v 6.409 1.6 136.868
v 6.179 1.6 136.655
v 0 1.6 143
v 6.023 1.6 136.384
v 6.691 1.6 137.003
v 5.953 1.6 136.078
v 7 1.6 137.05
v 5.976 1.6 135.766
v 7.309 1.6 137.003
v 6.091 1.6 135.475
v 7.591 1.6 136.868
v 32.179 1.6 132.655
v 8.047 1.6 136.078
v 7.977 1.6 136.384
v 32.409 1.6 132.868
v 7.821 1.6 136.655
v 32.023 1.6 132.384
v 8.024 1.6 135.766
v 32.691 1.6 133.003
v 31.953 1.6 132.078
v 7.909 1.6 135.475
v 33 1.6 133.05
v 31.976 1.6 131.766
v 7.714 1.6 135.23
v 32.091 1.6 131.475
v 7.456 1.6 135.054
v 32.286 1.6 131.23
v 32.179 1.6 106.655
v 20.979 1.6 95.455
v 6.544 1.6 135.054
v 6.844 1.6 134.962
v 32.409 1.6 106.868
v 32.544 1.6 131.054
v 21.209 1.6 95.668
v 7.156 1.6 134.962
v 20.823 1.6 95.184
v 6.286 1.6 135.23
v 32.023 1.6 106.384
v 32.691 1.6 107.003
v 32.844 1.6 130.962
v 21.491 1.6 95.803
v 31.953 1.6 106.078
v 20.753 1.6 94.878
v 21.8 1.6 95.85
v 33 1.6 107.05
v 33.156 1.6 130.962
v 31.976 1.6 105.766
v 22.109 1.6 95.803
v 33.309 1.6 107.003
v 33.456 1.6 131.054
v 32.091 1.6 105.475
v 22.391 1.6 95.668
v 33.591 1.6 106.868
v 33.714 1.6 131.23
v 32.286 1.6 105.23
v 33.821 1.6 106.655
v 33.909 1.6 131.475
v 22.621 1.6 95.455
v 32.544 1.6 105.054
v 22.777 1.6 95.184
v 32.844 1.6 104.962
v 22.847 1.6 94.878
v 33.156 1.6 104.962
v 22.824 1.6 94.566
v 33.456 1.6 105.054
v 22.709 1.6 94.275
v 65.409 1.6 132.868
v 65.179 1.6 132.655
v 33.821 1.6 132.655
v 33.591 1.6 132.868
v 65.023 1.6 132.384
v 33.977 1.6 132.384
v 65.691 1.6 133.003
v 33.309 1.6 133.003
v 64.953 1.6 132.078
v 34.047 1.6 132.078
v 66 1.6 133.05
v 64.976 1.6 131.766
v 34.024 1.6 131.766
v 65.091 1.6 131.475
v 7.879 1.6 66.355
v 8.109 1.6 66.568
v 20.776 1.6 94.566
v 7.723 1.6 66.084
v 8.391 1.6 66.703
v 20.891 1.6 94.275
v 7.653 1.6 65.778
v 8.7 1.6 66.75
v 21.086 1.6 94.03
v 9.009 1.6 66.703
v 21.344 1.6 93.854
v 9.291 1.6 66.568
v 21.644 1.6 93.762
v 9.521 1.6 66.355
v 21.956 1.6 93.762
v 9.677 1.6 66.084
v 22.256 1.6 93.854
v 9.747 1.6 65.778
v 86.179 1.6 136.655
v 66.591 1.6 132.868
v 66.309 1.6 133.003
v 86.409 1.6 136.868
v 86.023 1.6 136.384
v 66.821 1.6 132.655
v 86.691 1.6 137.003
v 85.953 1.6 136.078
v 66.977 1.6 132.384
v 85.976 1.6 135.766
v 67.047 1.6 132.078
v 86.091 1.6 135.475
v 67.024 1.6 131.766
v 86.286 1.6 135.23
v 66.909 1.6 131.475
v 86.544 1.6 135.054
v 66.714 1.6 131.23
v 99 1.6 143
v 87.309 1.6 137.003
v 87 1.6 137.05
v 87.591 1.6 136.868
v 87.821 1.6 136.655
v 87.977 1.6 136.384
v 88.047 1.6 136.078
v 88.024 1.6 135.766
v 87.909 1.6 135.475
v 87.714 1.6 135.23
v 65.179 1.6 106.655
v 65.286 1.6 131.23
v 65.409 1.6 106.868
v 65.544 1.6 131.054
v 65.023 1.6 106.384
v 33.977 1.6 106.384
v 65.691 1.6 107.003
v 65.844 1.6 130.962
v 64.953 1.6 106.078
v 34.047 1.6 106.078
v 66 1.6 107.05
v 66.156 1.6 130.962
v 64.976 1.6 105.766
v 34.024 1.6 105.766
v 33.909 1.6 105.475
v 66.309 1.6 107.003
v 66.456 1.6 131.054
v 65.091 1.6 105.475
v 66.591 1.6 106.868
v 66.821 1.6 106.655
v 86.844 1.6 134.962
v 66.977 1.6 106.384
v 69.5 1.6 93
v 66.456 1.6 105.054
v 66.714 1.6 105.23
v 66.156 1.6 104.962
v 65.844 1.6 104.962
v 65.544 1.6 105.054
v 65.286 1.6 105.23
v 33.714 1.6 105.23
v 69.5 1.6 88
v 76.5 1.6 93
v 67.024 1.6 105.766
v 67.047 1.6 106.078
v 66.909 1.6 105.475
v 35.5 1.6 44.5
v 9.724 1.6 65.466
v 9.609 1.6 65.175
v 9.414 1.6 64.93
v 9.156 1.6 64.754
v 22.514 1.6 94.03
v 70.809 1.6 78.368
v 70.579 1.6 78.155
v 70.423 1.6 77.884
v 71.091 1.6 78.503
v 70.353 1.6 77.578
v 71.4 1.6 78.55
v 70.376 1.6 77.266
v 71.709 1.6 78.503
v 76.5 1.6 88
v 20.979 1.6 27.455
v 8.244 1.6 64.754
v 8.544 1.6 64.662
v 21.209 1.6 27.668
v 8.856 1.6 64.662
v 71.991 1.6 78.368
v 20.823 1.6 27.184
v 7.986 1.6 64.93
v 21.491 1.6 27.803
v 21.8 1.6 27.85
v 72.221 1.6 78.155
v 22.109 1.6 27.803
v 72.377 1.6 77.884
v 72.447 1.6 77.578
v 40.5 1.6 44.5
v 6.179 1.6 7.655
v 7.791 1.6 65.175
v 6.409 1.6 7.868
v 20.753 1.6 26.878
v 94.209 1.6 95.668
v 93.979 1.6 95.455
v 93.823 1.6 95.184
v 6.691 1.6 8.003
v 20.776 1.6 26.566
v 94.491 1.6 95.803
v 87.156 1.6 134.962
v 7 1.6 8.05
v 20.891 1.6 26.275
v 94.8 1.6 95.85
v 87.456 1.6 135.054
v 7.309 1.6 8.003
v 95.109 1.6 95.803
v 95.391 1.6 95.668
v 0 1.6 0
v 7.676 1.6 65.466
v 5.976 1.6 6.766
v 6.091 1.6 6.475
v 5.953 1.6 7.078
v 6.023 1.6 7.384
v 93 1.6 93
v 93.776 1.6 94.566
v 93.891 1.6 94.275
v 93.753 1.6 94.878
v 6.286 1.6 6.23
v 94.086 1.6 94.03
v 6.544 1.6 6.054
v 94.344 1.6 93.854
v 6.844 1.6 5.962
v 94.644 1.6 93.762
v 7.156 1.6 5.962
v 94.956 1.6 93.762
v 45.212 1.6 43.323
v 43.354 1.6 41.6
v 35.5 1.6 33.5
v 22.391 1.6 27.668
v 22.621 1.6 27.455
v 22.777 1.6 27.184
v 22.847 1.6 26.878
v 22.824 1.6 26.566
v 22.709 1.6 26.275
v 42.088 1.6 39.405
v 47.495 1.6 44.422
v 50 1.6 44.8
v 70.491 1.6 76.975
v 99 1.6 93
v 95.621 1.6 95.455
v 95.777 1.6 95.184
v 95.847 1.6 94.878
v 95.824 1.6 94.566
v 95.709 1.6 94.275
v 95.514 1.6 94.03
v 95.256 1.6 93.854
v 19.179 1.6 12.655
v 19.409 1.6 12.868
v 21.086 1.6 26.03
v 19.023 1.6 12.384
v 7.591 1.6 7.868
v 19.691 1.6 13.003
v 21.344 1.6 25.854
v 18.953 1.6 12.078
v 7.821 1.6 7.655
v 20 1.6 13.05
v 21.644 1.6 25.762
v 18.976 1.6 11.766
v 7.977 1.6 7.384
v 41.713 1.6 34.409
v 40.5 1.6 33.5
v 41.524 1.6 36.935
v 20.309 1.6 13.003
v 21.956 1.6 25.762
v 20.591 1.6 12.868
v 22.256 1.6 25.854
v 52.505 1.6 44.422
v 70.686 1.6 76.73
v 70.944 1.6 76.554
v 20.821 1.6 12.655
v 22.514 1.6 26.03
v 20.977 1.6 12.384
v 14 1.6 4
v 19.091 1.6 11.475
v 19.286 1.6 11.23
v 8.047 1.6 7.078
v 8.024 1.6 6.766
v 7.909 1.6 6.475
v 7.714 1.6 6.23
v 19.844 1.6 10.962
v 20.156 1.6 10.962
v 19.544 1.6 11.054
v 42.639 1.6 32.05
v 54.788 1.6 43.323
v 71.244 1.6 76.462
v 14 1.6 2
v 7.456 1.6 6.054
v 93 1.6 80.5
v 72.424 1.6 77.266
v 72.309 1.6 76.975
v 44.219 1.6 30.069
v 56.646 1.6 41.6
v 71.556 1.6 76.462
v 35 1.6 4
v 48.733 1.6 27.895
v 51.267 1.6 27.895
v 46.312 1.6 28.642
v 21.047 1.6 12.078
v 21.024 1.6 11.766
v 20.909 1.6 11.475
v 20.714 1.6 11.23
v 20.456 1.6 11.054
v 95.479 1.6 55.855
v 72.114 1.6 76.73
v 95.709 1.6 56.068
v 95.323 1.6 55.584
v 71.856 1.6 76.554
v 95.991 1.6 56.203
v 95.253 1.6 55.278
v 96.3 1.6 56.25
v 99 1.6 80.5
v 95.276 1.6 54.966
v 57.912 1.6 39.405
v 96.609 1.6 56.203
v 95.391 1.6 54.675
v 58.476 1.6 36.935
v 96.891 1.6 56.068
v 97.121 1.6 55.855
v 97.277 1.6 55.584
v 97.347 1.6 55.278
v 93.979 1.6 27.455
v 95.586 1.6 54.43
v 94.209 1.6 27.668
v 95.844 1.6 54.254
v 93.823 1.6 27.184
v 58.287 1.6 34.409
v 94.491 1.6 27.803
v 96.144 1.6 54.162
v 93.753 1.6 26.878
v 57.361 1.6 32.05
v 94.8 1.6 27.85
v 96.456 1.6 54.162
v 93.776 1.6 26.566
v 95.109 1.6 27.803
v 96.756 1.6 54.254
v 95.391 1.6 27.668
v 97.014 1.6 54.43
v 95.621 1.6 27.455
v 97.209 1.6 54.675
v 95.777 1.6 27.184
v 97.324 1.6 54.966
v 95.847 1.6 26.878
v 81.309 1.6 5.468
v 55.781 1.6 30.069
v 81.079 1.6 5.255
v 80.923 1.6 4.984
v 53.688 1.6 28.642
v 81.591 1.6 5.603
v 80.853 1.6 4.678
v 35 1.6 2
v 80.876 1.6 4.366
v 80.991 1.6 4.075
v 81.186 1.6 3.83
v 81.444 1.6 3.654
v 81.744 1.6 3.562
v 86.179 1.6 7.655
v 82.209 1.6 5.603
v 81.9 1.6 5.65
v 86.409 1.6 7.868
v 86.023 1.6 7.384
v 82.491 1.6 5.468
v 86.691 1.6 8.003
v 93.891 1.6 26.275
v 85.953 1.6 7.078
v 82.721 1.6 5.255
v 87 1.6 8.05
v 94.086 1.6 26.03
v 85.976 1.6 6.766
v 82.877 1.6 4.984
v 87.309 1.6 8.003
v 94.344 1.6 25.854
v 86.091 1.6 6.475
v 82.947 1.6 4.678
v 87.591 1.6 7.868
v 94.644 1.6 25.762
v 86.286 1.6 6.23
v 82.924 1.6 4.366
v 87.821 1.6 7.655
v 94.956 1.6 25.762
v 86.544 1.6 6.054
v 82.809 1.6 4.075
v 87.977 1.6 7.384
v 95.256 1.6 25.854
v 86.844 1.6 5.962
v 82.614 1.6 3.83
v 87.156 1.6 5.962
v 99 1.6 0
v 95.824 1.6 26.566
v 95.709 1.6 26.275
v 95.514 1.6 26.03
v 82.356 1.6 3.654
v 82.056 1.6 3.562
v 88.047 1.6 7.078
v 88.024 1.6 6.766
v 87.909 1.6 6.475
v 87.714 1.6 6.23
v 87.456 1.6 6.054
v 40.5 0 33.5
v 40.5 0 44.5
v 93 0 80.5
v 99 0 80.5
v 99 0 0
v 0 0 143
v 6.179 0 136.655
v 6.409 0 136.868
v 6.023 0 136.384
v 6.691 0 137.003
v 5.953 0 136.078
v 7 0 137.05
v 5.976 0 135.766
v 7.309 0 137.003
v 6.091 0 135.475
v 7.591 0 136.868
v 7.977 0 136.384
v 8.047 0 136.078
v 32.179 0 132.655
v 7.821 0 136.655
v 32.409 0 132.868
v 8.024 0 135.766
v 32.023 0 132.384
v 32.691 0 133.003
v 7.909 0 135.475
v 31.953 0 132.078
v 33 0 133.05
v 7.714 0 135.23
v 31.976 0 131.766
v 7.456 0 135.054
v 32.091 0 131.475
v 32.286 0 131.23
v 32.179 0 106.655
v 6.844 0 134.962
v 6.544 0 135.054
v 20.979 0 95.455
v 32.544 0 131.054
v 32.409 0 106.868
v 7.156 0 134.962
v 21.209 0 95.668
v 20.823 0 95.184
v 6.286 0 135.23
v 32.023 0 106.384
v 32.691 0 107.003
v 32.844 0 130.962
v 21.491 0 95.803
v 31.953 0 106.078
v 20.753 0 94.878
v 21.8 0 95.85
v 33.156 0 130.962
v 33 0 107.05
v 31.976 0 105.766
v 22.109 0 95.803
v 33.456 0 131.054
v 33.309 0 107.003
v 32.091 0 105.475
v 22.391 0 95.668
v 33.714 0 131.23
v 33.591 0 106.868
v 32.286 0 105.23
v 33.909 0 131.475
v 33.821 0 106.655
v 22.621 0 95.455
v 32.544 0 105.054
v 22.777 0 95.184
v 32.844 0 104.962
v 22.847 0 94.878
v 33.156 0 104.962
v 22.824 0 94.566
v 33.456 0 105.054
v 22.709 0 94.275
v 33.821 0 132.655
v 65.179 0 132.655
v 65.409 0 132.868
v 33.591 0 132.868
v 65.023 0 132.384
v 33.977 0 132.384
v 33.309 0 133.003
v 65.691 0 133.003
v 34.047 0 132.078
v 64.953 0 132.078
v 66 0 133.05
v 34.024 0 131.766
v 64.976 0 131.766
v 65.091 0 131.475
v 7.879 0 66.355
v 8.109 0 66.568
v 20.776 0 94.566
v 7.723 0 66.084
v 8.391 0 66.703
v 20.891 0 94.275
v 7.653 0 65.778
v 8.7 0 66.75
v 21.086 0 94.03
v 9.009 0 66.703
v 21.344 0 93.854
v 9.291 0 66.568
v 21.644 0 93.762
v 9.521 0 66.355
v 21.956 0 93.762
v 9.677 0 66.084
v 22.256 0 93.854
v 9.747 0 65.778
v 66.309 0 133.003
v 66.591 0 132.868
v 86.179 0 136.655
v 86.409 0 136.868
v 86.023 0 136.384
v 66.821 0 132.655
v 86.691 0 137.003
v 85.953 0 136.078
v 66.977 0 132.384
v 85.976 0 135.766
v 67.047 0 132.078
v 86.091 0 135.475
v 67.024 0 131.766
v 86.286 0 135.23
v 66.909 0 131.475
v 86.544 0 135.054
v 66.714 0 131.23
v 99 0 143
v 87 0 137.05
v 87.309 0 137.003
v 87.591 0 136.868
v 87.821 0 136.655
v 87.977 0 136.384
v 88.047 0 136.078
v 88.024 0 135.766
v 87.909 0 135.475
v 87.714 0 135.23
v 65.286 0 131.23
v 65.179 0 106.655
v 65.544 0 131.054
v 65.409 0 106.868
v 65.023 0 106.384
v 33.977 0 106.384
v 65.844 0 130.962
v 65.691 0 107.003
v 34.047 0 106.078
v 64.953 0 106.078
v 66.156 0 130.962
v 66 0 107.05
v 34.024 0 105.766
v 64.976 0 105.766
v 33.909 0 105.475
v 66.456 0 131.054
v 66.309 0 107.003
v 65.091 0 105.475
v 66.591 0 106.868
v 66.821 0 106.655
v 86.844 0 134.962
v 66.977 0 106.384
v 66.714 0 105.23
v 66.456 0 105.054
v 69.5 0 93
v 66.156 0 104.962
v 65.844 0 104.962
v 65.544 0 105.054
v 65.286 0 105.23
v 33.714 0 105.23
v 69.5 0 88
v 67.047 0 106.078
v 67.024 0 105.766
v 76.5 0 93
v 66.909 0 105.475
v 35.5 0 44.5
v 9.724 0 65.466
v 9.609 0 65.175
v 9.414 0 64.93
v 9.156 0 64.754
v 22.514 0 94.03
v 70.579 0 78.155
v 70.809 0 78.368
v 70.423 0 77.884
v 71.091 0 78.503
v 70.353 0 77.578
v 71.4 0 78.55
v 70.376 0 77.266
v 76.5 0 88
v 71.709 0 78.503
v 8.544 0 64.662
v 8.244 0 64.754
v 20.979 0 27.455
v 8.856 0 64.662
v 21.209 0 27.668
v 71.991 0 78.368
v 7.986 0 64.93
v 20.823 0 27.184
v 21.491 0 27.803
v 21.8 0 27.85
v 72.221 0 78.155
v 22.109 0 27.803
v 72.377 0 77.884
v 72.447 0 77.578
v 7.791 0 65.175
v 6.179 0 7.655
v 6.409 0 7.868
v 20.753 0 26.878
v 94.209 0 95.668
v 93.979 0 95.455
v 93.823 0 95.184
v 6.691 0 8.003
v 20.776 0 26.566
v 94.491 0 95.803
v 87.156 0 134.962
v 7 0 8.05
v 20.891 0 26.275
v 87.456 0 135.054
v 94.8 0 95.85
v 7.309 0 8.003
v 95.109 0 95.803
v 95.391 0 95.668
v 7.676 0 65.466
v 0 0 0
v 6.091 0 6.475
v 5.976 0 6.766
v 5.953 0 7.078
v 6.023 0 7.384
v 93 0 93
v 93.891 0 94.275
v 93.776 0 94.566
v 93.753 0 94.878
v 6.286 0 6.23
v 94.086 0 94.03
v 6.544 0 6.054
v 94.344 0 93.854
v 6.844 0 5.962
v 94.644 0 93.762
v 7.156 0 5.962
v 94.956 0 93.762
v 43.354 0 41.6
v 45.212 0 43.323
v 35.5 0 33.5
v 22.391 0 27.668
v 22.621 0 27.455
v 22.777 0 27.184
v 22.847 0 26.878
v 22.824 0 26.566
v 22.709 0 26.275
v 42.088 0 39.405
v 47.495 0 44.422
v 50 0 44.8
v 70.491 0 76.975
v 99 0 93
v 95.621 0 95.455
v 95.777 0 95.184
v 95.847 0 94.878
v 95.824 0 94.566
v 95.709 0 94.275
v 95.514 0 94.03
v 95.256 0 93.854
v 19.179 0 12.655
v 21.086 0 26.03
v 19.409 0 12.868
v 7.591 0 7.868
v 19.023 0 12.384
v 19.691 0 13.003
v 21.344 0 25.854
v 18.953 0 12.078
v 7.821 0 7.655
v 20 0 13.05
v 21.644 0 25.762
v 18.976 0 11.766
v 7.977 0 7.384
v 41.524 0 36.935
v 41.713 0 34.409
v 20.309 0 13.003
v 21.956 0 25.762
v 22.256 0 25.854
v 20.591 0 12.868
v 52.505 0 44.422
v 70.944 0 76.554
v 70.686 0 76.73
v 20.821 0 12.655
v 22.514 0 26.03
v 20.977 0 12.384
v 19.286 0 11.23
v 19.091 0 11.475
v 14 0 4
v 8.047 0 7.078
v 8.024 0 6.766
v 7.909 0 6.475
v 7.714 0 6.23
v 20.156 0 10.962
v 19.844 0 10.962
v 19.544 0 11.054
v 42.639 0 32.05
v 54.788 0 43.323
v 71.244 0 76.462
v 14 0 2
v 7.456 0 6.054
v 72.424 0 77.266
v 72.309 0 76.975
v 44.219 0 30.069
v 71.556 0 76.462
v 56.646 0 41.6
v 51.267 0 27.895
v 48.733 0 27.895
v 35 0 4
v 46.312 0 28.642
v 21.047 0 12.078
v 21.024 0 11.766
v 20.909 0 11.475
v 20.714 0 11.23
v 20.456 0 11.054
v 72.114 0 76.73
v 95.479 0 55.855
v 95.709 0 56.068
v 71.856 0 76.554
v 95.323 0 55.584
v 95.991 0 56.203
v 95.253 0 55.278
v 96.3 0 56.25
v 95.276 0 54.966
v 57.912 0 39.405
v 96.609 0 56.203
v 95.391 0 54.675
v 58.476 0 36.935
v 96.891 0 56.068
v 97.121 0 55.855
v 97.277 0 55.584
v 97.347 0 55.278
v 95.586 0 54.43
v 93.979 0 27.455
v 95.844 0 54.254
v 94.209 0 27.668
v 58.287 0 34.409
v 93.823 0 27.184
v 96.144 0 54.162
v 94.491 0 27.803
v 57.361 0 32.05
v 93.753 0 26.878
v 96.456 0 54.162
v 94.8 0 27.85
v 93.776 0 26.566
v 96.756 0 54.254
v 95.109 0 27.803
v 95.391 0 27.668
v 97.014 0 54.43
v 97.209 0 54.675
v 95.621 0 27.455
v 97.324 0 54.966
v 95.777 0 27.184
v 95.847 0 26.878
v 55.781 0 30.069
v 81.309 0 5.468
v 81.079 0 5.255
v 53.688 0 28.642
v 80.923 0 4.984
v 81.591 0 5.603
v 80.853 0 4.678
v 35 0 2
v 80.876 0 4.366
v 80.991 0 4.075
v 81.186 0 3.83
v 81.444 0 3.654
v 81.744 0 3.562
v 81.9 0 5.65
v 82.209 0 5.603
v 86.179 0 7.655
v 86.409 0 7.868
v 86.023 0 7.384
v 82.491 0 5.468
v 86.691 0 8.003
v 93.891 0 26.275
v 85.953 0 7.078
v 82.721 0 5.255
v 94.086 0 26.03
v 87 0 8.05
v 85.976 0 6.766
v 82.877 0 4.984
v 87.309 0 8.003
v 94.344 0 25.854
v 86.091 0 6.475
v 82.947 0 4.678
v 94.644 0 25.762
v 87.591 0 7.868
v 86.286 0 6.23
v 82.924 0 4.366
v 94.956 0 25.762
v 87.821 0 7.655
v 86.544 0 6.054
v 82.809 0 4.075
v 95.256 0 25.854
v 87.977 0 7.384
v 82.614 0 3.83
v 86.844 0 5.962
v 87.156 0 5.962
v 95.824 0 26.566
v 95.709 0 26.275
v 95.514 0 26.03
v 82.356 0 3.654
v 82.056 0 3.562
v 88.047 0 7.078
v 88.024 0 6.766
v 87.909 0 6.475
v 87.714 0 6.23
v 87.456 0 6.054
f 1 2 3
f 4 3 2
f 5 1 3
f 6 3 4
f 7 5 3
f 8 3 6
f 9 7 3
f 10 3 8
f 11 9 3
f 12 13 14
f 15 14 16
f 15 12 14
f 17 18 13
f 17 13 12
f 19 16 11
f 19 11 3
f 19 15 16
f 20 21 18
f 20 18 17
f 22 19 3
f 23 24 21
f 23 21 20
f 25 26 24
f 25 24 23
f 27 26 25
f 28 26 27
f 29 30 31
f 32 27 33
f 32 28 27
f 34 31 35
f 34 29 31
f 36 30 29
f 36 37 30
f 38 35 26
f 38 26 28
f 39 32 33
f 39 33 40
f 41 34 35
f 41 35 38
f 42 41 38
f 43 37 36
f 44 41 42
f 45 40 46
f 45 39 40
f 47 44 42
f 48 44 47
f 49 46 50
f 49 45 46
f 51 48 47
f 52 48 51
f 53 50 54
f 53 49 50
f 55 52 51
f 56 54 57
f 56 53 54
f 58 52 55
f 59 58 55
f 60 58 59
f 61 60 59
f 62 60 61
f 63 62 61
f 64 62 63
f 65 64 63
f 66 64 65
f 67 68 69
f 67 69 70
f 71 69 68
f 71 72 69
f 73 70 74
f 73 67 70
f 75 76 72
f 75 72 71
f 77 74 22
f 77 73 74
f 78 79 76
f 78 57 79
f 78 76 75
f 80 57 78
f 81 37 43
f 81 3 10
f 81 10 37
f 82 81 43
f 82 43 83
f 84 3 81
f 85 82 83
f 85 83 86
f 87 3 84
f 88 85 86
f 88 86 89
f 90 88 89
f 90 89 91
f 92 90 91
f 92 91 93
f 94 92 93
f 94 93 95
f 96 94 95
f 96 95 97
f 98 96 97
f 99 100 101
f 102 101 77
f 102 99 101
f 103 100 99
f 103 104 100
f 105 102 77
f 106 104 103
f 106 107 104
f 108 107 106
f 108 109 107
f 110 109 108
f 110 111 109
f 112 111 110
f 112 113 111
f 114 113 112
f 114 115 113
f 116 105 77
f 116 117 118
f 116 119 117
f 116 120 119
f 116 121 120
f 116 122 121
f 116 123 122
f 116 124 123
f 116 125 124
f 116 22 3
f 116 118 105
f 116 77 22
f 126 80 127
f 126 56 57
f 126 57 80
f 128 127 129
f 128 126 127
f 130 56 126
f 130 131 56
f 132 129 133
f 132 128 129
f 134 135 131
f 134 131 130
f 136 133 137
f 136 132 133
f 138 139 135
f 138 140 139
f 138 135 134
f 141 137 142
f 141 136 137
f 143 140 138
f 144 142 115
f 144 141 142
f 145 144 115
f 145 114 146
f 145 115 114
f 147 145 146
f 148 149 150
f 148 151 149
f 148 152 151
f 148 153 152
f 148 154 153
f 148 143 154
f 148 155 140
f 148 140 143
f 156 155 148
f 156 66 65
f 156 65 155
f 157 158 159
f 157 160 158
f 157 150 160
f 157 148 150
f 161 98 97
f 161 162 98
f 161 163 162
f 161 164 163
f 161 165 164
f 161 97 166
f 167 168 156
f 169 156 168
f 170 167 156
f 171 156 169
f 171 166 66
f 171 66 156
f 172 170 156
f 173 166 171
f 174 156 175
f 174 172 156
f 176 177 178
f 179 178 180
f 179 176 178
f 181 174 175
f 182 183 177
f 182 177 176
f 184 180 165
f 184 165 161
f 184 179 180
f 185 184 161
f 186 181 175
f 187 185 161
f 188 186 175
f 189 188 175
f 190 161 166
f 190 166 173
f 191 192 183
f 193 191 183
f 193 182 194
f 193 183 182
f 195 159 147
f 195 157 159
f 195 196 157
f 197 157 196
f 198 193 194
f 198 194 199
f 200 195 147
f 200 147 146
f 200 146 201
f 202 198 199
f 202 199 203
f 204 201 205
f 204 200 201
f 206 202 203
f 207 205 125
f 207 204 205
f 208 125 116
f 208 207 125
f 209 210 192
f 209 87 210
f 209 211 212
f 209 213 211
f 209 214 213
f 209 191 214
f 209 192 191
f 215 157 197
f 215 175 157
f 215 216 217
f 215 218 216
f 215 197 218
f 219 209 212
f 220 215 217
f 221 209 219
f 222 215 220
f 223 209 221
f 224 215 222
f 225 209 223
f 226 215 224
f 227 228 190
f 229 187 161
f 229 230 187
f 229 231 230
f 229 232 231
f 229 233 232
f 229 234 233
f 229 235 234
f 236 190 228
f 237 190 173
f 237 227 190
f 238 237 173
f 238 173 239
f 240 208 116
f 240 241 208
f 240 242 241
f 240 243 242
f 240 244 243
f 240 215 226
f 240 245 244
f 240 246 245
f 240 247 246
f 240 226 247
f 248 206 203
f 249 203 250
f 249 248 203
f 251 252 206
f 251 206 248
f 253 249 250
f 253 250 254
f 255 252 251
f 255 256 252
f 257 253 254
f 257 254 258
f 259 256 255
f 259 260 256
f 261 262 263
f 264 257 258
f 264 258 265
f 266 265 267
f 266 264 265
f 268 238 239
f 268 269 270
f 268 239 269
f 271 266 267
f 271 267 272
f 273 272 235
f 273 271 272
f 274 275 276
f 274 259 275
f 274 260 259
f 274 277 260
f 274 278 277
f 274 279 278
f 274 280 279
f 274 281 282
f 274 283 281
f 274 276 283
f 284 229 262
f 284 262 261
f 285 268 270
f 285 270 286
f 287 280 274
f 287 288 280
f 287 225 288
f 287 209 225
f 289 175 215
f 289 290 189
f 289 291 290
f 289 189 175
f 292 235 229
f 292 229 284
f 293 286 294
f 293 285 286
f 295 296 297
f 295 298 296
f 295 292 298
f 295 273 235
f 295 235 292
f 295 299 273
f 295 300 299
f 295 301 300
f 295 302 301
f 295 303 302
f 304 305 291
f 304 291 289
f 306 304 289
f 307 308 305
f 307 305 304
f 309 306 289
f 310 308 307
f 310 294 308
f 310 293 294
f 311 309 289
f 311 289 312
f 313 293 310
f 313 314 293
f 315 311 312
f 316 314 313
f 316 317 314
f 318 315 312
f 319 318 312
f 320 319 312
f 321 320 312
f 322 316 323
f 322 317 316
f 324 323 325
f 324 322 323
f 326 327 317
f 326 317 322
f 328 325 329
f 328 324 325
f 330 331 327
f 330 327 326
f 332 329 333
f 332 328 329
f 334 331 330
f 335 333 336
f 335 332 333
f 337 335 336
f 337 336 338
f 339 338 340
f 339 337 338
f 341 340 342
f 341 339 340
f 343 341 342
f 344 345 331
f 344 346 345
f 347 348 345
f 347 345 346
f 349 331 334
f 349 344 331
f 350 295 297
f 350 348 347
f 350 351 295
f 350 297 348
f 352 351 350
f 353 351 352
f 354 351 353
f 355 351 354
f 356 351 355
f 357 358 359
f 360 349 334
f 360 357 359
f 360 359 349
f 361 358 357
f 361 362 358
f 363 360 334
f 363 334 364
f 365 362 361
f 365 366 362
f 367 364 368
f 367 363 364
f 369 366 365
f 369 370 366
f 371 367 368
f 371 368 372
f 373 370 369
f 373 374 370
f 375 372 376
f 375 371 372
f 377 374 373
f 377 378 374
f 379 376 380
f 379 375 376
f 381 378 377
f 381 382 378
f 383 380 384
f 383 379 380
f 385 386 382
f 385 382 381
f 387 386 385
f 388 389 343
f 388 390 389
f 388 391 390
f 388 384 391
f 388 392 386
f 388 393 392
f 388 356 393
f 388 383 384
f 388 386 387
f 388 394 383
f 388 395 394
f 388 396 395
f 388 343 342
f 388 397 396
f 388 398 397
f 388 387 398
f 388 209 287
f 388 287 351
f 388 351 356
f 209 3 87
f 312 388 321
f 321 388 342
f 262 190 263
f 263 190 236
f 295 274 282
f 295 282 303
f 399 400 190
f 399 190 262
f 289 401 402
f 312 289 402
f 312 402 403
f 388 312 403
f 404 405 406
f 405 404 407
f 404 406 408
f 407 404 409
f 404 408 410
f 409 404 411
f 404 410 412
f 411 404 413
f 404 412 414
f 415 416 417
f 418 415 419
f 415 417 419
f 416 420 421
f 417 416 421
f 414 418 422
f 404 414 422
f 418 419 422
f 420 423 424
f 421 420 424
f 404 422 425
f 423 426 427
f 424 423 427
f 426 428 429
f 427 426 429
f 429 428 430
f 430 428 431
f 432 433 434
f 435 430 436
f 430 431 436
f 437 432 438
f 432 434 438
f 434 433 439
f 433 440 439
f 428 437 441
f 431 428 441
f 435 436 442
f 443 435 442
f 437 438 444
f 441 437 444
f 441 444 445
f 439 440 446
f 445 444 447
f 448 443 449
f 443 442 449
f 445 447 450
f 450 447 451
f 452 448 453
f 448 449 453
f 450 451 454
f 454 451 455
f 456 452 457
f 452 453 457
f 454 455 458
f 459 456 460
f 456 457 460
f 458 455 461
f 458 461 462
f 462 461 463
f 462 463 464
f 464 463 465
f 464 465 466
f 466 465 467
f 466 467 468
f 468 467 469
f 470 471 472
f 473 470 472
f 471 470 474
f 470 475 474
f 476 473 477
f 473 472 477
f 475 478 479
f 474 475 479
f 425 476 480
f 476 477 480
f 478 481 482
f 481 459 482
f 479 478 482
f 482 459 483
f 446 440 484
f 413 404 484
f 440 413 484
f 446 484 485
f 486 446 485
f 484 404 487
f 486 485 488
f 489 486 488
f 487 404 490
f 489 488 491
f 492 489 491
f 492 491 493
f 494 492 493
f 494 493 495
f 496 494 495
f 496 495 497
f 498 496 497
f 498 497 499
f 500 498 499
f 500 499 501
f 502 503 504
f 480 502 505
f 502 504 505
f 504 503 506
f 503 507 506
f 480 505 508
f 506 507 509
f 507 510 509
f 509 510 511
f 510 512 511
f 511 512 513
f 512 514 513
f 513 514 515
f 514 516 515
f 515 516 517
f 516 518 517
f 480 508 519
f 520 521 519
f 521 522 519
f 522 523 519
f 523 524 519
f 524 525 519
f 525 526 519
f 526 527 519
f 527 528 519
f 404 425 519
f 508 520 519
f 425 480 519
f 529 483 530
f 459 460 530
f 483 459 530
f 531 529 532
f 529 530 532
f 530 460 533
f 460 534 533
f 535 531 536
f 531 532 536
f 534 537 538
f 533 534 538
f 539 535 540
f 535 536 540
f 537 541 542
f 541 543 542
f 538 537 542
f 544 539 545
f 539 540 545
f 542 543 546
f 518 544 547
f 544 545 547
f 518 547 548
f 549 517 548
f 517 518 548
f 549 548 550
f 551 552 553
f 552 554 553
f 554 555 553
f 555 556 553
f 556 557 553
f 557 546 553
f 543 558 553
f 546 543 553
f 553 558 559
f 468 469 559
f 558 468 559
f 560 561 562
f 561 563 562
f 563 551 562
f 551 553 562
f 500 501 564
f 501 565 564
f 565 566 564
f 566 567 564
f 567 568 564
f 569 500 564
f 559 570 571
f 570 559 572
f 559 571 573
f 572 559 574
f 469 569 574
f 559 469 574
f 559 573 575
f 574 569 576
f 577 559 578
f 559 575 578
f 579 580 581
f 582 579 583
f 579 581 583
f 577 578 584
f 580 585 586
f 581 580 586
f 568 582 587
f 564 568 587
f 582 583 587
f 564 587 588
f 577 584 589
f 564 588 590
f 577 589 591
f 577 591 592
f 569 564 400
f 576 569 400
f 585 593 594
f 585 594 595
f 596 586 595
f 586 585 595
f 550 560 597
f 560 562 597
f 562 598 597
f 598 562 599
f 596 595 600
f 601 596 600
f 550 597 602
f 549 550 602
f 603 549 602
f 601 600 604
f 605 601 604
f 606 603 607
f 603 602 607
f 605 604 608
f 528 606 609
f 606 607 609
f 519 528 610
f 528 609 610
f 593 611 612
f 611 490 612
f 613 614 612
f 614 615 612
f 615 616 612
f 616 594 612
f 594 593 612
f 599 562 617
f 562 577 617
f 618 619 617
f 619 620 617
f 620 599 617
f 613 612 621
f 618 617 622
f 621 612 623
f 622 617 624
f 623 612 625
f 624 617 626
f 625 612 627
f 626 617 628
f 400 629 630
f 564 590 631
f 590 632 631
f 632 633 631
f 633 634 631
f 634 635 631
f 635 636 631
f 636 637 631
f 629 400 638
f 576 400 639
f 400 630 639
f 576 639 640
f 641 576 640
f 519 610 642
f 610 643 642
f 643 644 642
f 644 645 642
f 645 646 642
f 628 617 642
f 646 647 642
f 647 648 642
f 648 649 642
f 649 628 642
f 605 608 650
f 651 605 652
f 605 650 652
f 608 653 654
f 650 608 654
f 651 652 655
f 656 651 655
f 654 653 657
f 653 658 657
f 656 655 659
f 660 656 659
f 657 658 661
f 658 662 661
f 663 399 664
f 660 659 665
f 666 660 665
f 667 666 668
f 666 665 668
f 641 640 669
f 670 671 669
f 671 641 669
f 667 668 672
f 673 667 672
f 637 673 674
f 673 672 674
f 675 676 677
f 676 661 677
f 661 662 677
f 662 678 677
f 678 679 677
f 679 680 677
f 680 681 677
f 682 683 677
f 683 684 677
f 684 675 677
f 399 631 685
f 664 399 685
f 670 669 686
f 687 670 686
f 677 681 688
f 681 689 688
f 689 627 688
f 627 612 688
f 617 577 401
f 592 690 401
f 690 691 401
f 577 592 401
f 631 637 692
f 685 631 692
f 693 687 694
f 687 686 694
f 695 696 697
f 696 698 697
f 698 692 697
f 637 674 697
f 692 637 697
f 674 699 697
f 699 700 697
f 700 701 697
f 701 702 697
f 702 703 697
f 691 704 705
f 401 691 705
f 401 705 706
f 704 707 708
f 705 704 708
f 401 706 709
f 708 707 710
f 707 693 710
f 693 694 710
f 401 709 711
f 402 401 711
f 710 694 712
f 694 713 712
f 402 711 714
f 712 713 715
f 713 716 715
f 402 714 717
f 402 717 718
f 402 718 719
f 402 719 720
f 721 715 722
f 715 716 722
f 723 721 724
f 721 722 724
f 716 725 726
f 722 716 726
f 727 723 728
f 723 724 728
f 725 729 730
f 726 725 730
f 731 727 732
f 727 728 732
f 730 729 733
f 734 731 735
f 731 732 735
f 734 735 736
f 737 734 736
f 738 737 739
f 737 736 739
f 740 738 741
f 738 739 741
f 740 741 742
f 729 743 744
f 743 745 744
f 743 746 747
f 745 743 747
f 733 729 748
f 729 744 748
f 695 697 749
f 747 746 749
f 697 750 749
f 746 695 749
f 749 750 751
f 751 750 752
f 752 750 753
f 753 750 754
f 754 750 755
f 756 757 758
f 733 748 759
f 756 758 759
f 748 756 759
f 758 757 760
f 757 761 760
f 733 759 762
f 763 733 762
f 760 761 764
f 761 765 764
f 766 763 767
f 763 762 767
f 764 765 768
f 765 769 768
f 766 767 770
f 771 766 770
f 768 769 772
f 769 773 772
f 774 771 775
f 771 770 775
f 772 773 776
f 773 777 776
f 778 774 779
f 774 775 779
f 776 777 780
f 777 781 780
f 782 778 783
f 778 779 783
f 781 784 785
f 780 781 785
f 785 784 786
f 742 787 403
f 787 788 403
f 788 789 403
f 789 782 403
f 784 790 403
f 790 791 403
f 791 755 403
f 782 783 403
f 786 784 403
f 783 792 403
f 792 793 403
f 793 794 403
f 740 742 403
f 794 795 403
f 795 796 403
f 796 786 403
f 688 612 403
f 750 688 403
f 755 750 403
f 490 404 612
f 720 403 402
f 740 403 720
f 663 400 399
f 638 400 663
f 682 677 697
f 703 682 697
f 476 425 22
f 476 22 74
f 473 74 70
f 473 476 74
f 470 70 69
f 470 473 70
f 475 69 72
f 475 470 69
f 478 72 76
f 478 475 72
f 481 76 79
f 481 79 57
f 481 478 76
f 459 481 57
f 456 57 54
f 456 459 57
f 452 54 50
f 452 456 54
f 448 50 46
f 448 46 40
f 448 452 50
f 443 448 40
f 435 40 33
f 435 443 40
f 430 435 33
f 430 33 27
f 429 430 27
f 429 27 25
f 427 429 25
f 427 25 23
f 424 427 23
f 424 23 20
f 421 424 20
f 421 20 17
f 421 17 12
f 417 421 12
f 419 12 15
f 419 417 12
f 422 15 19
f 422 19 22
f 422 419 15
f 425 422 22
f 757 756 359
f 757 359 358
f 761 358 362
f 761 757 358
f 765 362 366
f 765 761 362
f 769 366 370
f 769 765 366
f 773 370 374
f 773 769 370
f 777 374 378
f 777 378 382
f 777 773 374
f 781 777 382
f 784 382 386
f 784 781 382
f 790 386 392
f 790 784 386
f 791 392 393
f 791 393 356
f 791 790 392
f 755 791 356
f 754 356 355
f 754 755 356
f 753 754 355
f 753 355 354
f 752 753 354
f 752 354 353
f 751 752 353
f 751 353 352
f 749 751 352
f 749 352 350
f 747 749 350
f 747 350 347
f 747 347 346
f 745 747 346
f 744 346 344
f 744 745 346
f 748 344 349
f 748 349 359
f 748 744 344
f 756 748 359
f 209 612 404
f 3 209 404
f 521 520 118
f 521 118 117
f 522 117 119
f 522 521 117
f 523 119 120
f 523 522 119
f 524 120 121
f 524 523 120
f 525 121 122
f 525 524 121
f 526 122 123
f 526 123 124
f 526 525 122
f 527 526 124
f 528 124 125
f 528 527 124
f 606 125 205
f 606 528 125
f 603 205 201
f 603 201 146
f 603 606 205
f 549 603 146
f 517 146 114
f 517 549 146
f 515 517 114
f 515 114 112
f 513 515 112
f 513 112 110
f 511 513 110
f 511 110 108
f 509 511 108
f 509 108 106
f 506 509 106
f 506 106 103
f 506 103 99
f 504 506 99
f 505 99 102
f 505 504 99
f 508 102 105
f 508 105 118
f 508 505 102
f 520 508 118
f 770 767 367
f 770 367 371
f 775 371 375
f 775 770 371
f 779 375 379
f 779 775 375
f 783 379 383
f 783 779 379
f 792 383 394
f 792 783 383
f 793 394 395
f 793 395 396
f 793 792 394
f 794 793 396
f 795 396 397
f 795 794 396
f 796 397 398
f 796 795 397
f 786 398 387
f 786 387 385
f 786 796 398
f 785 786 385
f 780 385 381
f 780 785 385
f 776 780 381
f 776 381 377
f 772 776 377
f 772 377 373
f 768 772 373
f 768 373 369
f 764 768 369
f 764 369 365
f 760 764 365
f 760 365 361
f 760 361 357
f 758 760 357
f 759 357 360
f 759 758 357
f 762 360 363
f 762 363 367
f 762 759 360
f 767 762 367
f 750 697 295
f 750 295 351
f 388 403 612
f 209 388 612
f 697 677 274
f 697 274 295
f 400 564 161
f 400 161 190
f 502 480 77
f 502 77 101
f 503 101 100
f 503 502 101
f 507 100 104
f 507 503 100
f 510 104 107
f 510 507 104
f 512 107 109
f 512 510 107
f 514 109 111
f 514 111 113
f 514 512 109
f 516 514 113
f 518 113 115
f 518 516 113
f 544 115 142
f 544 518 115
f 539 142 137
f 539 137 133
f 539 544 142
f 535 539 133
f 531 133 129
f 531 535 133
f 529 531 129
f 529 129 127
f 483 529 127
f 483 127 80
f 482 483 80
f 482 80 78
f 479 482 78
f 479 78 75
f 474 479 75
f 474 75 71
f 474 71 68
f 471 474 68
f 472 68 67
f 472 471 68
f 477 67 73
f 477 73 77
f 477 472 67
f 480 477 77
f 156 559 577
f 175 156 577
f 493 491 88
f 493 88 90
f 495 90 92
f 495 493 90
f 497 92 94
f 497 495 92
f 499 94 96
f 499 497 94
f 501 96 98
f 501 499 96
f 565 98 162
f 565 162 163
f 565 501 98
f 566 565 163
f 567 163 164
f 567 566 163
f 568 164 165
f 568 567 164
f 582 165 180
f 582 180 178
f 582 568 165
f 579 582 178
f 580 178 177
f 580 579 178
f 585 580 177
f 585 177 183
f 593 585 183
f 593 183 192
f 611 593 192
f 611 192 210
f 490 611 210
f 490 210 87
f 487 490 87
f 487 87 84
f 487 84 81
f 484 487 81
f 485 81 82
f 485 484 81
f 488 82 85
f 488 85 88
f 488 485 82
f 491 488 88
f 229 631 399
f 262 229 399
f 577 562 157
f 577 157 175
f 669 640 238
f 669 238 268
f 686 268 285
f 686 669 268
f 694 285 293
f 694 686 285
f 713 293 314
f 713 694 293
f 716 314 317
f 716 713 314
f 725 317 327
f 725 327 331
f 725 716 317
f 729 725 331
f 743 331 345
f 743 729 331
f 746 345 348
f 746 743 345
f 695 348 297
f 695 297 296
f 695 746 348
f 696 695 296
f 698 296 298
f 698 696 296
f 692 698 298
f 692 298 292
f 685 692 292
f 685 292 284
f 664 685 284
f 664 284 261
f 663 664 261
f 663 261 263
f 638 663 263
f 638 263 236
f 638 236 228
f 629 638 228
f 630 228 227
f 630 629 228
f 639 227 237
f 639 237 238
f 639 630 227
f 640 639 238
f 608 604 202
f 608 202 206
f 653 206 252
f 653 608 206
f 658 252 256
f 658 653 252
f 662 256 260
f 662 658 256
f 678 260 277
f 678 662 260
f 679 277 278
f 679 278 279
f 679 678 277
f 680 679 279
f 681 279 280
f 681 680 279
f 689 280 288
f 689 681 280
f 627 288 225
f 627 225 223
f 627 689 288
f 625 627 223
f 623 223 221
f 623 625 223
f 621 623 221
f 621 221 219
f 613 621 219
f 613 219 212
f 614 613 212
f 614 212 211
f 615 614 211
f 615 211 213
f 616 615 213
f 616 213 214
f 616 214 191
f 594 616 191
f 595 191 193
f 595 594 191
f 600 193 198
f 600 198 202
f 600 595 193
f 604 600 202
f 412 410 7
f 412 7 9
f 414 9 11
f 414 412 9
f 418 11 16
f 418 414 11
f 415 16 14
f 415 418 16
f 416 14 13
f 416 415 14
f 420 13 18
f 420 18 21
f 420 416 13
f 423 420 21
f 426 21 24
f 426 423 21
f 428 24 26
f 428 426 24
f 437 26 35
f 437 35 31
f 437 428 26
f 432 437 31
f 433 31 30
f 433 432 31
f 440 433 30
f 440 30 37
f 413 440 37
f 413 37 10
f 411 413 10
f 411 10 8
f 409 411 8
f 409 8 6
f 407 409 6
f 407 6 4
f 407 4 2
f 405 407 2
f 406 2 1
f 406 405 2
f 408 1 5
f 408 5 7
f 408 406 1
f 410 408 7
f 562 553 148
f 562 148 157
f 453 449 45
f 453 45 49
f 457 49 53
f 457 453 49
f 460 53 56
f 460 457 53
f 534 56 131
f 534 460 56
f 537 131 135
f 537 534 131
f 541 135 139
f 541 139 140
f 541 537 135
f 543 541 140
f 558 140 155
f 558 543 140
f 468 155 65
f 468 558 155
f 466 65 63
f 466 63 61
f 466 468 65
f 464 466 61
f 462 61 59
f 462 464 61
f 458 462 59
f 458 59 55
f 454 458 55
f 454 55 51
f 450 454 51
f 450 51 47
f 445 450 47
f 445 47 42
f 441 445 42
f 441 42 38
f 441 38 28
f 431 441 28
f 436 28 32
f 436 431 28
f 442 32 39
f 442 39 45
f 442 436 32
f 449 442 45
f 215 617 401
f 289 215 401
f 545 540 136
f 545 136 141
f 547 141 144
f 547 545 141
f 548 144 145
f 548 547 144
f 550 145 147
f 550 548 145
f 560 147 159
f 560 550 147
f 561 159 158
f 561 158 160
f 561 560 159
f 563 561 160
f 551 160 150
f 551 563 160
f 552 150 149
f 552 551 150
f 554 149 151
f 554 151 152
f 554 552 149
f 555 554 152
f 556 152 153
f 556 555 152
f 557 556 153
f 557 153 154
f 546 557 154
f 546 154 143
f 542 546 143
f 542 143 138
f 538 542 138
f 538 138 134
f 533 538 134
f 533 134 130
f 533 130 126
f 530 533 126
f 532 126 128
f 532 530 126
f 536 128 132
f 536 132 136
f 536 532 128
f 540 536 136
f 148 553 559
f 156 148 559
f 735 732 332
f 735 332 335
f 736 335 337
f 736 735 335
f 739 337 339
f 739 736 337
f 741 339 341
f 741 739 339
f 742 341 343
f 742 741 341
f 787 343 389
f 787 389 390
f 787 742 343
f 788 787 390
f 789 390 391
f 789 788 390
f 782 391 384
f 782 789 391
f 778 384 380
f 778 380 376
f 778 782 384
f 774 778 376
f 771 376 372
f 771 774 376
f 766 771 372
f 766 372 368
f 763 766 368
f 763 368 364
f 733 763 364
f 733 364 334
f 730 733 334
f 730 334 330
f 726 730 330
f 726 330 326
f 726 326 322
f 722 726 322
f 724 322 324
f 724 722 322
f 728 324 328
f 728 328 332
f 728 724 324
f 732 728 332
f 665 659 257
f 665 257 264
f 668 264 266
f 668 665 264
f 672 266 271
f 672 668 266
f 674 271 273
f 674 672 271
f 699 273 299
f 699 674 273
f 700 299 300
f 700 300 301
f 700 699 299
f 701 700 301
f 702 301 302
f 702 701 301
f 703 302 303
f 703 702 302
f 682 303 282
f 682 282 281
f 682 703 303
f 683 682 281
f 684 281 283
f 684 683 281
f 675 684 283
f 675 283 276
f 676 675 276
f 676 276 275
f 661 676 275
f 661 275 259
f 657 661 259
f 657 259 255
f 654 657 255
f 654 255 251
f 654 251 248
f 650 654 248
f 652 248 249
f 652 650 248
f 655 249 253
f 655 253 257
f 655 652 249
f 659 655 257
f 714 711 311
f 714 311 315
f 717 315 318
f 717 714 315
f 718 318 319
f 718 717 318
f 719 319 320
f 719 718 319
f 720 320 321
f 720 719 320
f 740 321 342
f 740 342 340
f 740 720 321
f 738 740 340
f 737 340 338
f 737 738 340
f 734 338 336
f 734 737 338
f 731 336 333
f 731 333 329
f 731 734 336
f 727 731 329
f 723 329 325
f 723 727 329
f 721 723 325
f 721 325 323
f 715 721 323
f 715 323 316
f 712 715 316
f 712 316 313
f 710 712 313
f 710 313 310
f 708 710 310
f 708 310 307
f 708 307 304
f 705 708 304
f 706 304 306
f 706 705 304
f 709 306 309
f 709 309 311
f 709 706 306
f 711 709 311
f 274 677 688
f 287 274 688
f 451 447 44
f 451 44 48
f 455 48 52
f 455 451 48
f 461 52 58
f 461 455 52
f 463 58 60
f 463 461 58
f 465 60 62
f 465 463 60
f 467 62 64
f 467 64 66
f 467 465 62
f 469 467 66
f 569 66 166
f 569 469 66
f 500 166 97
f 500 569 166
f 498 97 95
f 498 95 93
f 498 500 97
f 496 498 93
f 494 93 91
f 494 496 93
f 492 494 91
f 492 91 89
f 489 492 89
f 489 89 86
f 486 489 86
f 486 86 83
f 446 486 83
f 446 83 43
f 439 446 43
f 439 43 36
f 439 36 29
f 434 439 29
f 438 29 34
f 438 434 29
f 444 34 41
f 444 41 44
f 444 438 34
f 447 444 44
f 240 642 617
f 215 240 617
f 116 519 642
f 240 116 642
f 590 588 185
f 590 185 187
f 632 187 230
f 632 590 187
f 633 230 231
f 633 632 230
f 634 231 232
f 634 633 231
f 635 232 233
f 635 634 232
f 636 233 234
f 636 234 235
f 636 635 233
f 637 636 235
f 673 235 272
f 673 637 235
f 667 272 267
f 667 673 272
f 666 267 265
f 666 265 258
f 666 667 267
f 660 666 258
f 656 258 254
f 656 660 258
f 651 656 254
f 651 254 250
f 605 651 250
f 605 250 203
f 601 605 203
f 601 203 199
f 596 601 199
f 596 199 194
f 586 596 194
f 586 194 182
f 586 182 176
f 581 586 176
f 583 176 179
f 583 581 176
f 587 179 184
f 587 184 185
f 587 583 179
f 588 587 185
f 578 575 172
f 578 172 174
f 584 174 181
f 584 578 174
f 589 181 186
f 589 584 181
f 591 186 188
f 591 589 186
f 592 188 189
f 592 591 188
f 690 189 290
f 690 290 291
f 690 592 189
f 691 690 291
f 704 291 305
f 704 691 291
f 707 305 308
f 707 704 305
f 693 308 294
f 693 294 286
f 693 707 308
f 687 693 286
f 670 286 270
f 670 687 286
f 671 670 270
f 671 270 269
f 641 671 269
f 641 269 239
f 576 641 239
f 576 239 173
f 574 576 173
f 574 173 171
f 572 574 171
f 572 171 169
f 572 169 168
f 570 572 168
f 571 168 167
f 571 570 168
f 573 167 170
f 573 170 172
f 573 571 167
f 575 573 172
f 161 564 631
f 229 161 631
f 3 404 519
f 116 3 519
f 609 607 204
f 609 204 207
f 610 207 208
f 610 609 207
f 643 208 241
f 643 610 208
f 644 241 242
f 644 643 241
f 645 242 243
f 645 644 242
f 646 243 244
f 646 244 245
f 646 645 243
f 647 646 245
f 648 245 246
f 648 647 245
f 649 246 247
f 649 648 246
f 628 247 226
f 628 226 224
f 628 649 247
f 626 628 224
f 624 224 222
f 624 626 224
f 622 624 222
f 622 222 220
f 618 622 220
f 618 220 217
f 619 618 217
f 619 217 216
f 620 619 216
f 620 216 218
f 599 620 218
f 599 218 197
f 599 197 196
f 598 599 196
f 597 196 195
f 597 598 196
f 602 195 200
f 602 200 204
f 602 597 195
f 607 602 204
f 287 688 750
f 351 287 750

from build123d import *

# Parameters (mm, degrees)
SKETCH_1_R      = 1.05
SKETCH_1_W      = 7
SKETCH_1_H      = 5
SKETCH_1_W_2    = 5
SKETCH_1_H_2    = 11
SKETCH_1_W_3    = 21
SKETCH_1_H_3    = 2
SKETCH_1_R_2    = 8.5
EXTRUDE_1_DEPTH = 1.6


with BuildPart() as part:
    # 草图1 → 凸台-拉伸1 (new body)
    with BuildSketch(Plane(origin=(0, 0, 0), x_dir=(1, 0, 0), z_dir=(0, 1, 0))):
        Polygon((99, 0), (0, 0), (0, -143), (99, -143), (99, -93), (93, -93), (93, -80.5), (99, -80.5), align=None)
        with Locations(Location((21.8, -94.8, 0), (0, 0, 270))):
            Circle(SKETCH_1_R, mode=Mode.SUBTRACT)
        with Locations((73, -90.5)):
            Rectangle(SKETCH_1_W, SKETCH_1_H, mode=Mode.SUBTRACT)
        with Locations(Location((71.4, -77.5, 0), (0, 0, 270))):
            Circle(SKETCH_1_R, mode=Mode.SUBTRACT)
        with Locations(Location((94.8, -94.8, 0), (0, 0, 270))):
            Circle(SKETCH_1_R, mode=Mode.SUBTRACT)
        with Locations(Location((8.7, -65.7, 0), (0, 0, 270))):
            Circle(SKETCH_1_R, mode=Mode.SUBTRACT)
        with Locations((38, -39)):
            Rectangle(SKETCH_1_W_2, SKETCH_1_H_2, mode=Mode.SUBTRACT)
        with Locations(Location((21.8, -26.8, 0), (0, 0, 270))):
            Circle(SKETCH_1_R, mode=Mode.SUBTRACT)
        with Locations(Location((7, -7, 0), (0, 0, 270))):
            Circle(SKETCH_1_R, mode=Mode.SUBTRACT)
        with Locations(Location((20, -12, 0), (0, 0, 270))):
            Circle(SKETCH_1_R, mode=Mode.SUBTRACT)
        with Locations((24.5, -3)):
            Rectangle(SKETCH_1_W_3, SKETCH_1_H_3, mode=Mode.SUBTRACT)
        with Locations(Location((50, -36.3, 0), (0, 0, 270))):
            Circle(SKETCH_1_R_2, mode=Mode.SUBTRACT)
        with Locations(Location((96.3, -55.2, 0), (0, 0, 270))):
            Circle(SKETCH_1_R, mode=Mode.SUBTRACT)
        with Locations(Location((94.8, -26.8, 0), (0, 0, 270))):
            Circle(SKETCH_1_R, mode=Mode.SUBTRACT)
        with Locations(Location((81.9, -4.6, 0), (0, 0, 270))):
            Circle(SKETCH_1_R, mode=Mode.SUBTRACT)
        with Locations(Location((87, -7, 0), (0, 0, 270))):
            Circle(SKETCH_1_R, mode=Mode.SUBTRACT)
        with Locations(Location((66, -106, 0), (0, 0, 270))):
            Circle(SKETCH_1_R, mode=Mode.SUBTRACT)
        with Locations(Location((7, -136, 0), (0, 0, 270))):
            Circle(SKETCH_1_R, mode=Mode.SUBTRACT)
        with Locations(Location((33, -132, 0), (0, 0, 270))):
            Circle(SKETCH_1_R, mode=Mode.SUBTRACT)
        with Locations(Location((33, -106, 0), (0, 0, 270))):
            Circle(SKETCH_1_R, mode=Mode.SUBTRACT)
        with Locations(Location((66, -132, 0), (0, 0, 270))):
            Circle(SKETCH_1_R, mode=Mode.SUBTRACT)
        with Locations(Location((87, -136, 0), (0, 0, 270))):
            Circle(SKETCH_1_R, mode=Mode.SUBTRACT)
    extrude(amount=EXTRUDE_1_DEPTH)


solid = part.part
